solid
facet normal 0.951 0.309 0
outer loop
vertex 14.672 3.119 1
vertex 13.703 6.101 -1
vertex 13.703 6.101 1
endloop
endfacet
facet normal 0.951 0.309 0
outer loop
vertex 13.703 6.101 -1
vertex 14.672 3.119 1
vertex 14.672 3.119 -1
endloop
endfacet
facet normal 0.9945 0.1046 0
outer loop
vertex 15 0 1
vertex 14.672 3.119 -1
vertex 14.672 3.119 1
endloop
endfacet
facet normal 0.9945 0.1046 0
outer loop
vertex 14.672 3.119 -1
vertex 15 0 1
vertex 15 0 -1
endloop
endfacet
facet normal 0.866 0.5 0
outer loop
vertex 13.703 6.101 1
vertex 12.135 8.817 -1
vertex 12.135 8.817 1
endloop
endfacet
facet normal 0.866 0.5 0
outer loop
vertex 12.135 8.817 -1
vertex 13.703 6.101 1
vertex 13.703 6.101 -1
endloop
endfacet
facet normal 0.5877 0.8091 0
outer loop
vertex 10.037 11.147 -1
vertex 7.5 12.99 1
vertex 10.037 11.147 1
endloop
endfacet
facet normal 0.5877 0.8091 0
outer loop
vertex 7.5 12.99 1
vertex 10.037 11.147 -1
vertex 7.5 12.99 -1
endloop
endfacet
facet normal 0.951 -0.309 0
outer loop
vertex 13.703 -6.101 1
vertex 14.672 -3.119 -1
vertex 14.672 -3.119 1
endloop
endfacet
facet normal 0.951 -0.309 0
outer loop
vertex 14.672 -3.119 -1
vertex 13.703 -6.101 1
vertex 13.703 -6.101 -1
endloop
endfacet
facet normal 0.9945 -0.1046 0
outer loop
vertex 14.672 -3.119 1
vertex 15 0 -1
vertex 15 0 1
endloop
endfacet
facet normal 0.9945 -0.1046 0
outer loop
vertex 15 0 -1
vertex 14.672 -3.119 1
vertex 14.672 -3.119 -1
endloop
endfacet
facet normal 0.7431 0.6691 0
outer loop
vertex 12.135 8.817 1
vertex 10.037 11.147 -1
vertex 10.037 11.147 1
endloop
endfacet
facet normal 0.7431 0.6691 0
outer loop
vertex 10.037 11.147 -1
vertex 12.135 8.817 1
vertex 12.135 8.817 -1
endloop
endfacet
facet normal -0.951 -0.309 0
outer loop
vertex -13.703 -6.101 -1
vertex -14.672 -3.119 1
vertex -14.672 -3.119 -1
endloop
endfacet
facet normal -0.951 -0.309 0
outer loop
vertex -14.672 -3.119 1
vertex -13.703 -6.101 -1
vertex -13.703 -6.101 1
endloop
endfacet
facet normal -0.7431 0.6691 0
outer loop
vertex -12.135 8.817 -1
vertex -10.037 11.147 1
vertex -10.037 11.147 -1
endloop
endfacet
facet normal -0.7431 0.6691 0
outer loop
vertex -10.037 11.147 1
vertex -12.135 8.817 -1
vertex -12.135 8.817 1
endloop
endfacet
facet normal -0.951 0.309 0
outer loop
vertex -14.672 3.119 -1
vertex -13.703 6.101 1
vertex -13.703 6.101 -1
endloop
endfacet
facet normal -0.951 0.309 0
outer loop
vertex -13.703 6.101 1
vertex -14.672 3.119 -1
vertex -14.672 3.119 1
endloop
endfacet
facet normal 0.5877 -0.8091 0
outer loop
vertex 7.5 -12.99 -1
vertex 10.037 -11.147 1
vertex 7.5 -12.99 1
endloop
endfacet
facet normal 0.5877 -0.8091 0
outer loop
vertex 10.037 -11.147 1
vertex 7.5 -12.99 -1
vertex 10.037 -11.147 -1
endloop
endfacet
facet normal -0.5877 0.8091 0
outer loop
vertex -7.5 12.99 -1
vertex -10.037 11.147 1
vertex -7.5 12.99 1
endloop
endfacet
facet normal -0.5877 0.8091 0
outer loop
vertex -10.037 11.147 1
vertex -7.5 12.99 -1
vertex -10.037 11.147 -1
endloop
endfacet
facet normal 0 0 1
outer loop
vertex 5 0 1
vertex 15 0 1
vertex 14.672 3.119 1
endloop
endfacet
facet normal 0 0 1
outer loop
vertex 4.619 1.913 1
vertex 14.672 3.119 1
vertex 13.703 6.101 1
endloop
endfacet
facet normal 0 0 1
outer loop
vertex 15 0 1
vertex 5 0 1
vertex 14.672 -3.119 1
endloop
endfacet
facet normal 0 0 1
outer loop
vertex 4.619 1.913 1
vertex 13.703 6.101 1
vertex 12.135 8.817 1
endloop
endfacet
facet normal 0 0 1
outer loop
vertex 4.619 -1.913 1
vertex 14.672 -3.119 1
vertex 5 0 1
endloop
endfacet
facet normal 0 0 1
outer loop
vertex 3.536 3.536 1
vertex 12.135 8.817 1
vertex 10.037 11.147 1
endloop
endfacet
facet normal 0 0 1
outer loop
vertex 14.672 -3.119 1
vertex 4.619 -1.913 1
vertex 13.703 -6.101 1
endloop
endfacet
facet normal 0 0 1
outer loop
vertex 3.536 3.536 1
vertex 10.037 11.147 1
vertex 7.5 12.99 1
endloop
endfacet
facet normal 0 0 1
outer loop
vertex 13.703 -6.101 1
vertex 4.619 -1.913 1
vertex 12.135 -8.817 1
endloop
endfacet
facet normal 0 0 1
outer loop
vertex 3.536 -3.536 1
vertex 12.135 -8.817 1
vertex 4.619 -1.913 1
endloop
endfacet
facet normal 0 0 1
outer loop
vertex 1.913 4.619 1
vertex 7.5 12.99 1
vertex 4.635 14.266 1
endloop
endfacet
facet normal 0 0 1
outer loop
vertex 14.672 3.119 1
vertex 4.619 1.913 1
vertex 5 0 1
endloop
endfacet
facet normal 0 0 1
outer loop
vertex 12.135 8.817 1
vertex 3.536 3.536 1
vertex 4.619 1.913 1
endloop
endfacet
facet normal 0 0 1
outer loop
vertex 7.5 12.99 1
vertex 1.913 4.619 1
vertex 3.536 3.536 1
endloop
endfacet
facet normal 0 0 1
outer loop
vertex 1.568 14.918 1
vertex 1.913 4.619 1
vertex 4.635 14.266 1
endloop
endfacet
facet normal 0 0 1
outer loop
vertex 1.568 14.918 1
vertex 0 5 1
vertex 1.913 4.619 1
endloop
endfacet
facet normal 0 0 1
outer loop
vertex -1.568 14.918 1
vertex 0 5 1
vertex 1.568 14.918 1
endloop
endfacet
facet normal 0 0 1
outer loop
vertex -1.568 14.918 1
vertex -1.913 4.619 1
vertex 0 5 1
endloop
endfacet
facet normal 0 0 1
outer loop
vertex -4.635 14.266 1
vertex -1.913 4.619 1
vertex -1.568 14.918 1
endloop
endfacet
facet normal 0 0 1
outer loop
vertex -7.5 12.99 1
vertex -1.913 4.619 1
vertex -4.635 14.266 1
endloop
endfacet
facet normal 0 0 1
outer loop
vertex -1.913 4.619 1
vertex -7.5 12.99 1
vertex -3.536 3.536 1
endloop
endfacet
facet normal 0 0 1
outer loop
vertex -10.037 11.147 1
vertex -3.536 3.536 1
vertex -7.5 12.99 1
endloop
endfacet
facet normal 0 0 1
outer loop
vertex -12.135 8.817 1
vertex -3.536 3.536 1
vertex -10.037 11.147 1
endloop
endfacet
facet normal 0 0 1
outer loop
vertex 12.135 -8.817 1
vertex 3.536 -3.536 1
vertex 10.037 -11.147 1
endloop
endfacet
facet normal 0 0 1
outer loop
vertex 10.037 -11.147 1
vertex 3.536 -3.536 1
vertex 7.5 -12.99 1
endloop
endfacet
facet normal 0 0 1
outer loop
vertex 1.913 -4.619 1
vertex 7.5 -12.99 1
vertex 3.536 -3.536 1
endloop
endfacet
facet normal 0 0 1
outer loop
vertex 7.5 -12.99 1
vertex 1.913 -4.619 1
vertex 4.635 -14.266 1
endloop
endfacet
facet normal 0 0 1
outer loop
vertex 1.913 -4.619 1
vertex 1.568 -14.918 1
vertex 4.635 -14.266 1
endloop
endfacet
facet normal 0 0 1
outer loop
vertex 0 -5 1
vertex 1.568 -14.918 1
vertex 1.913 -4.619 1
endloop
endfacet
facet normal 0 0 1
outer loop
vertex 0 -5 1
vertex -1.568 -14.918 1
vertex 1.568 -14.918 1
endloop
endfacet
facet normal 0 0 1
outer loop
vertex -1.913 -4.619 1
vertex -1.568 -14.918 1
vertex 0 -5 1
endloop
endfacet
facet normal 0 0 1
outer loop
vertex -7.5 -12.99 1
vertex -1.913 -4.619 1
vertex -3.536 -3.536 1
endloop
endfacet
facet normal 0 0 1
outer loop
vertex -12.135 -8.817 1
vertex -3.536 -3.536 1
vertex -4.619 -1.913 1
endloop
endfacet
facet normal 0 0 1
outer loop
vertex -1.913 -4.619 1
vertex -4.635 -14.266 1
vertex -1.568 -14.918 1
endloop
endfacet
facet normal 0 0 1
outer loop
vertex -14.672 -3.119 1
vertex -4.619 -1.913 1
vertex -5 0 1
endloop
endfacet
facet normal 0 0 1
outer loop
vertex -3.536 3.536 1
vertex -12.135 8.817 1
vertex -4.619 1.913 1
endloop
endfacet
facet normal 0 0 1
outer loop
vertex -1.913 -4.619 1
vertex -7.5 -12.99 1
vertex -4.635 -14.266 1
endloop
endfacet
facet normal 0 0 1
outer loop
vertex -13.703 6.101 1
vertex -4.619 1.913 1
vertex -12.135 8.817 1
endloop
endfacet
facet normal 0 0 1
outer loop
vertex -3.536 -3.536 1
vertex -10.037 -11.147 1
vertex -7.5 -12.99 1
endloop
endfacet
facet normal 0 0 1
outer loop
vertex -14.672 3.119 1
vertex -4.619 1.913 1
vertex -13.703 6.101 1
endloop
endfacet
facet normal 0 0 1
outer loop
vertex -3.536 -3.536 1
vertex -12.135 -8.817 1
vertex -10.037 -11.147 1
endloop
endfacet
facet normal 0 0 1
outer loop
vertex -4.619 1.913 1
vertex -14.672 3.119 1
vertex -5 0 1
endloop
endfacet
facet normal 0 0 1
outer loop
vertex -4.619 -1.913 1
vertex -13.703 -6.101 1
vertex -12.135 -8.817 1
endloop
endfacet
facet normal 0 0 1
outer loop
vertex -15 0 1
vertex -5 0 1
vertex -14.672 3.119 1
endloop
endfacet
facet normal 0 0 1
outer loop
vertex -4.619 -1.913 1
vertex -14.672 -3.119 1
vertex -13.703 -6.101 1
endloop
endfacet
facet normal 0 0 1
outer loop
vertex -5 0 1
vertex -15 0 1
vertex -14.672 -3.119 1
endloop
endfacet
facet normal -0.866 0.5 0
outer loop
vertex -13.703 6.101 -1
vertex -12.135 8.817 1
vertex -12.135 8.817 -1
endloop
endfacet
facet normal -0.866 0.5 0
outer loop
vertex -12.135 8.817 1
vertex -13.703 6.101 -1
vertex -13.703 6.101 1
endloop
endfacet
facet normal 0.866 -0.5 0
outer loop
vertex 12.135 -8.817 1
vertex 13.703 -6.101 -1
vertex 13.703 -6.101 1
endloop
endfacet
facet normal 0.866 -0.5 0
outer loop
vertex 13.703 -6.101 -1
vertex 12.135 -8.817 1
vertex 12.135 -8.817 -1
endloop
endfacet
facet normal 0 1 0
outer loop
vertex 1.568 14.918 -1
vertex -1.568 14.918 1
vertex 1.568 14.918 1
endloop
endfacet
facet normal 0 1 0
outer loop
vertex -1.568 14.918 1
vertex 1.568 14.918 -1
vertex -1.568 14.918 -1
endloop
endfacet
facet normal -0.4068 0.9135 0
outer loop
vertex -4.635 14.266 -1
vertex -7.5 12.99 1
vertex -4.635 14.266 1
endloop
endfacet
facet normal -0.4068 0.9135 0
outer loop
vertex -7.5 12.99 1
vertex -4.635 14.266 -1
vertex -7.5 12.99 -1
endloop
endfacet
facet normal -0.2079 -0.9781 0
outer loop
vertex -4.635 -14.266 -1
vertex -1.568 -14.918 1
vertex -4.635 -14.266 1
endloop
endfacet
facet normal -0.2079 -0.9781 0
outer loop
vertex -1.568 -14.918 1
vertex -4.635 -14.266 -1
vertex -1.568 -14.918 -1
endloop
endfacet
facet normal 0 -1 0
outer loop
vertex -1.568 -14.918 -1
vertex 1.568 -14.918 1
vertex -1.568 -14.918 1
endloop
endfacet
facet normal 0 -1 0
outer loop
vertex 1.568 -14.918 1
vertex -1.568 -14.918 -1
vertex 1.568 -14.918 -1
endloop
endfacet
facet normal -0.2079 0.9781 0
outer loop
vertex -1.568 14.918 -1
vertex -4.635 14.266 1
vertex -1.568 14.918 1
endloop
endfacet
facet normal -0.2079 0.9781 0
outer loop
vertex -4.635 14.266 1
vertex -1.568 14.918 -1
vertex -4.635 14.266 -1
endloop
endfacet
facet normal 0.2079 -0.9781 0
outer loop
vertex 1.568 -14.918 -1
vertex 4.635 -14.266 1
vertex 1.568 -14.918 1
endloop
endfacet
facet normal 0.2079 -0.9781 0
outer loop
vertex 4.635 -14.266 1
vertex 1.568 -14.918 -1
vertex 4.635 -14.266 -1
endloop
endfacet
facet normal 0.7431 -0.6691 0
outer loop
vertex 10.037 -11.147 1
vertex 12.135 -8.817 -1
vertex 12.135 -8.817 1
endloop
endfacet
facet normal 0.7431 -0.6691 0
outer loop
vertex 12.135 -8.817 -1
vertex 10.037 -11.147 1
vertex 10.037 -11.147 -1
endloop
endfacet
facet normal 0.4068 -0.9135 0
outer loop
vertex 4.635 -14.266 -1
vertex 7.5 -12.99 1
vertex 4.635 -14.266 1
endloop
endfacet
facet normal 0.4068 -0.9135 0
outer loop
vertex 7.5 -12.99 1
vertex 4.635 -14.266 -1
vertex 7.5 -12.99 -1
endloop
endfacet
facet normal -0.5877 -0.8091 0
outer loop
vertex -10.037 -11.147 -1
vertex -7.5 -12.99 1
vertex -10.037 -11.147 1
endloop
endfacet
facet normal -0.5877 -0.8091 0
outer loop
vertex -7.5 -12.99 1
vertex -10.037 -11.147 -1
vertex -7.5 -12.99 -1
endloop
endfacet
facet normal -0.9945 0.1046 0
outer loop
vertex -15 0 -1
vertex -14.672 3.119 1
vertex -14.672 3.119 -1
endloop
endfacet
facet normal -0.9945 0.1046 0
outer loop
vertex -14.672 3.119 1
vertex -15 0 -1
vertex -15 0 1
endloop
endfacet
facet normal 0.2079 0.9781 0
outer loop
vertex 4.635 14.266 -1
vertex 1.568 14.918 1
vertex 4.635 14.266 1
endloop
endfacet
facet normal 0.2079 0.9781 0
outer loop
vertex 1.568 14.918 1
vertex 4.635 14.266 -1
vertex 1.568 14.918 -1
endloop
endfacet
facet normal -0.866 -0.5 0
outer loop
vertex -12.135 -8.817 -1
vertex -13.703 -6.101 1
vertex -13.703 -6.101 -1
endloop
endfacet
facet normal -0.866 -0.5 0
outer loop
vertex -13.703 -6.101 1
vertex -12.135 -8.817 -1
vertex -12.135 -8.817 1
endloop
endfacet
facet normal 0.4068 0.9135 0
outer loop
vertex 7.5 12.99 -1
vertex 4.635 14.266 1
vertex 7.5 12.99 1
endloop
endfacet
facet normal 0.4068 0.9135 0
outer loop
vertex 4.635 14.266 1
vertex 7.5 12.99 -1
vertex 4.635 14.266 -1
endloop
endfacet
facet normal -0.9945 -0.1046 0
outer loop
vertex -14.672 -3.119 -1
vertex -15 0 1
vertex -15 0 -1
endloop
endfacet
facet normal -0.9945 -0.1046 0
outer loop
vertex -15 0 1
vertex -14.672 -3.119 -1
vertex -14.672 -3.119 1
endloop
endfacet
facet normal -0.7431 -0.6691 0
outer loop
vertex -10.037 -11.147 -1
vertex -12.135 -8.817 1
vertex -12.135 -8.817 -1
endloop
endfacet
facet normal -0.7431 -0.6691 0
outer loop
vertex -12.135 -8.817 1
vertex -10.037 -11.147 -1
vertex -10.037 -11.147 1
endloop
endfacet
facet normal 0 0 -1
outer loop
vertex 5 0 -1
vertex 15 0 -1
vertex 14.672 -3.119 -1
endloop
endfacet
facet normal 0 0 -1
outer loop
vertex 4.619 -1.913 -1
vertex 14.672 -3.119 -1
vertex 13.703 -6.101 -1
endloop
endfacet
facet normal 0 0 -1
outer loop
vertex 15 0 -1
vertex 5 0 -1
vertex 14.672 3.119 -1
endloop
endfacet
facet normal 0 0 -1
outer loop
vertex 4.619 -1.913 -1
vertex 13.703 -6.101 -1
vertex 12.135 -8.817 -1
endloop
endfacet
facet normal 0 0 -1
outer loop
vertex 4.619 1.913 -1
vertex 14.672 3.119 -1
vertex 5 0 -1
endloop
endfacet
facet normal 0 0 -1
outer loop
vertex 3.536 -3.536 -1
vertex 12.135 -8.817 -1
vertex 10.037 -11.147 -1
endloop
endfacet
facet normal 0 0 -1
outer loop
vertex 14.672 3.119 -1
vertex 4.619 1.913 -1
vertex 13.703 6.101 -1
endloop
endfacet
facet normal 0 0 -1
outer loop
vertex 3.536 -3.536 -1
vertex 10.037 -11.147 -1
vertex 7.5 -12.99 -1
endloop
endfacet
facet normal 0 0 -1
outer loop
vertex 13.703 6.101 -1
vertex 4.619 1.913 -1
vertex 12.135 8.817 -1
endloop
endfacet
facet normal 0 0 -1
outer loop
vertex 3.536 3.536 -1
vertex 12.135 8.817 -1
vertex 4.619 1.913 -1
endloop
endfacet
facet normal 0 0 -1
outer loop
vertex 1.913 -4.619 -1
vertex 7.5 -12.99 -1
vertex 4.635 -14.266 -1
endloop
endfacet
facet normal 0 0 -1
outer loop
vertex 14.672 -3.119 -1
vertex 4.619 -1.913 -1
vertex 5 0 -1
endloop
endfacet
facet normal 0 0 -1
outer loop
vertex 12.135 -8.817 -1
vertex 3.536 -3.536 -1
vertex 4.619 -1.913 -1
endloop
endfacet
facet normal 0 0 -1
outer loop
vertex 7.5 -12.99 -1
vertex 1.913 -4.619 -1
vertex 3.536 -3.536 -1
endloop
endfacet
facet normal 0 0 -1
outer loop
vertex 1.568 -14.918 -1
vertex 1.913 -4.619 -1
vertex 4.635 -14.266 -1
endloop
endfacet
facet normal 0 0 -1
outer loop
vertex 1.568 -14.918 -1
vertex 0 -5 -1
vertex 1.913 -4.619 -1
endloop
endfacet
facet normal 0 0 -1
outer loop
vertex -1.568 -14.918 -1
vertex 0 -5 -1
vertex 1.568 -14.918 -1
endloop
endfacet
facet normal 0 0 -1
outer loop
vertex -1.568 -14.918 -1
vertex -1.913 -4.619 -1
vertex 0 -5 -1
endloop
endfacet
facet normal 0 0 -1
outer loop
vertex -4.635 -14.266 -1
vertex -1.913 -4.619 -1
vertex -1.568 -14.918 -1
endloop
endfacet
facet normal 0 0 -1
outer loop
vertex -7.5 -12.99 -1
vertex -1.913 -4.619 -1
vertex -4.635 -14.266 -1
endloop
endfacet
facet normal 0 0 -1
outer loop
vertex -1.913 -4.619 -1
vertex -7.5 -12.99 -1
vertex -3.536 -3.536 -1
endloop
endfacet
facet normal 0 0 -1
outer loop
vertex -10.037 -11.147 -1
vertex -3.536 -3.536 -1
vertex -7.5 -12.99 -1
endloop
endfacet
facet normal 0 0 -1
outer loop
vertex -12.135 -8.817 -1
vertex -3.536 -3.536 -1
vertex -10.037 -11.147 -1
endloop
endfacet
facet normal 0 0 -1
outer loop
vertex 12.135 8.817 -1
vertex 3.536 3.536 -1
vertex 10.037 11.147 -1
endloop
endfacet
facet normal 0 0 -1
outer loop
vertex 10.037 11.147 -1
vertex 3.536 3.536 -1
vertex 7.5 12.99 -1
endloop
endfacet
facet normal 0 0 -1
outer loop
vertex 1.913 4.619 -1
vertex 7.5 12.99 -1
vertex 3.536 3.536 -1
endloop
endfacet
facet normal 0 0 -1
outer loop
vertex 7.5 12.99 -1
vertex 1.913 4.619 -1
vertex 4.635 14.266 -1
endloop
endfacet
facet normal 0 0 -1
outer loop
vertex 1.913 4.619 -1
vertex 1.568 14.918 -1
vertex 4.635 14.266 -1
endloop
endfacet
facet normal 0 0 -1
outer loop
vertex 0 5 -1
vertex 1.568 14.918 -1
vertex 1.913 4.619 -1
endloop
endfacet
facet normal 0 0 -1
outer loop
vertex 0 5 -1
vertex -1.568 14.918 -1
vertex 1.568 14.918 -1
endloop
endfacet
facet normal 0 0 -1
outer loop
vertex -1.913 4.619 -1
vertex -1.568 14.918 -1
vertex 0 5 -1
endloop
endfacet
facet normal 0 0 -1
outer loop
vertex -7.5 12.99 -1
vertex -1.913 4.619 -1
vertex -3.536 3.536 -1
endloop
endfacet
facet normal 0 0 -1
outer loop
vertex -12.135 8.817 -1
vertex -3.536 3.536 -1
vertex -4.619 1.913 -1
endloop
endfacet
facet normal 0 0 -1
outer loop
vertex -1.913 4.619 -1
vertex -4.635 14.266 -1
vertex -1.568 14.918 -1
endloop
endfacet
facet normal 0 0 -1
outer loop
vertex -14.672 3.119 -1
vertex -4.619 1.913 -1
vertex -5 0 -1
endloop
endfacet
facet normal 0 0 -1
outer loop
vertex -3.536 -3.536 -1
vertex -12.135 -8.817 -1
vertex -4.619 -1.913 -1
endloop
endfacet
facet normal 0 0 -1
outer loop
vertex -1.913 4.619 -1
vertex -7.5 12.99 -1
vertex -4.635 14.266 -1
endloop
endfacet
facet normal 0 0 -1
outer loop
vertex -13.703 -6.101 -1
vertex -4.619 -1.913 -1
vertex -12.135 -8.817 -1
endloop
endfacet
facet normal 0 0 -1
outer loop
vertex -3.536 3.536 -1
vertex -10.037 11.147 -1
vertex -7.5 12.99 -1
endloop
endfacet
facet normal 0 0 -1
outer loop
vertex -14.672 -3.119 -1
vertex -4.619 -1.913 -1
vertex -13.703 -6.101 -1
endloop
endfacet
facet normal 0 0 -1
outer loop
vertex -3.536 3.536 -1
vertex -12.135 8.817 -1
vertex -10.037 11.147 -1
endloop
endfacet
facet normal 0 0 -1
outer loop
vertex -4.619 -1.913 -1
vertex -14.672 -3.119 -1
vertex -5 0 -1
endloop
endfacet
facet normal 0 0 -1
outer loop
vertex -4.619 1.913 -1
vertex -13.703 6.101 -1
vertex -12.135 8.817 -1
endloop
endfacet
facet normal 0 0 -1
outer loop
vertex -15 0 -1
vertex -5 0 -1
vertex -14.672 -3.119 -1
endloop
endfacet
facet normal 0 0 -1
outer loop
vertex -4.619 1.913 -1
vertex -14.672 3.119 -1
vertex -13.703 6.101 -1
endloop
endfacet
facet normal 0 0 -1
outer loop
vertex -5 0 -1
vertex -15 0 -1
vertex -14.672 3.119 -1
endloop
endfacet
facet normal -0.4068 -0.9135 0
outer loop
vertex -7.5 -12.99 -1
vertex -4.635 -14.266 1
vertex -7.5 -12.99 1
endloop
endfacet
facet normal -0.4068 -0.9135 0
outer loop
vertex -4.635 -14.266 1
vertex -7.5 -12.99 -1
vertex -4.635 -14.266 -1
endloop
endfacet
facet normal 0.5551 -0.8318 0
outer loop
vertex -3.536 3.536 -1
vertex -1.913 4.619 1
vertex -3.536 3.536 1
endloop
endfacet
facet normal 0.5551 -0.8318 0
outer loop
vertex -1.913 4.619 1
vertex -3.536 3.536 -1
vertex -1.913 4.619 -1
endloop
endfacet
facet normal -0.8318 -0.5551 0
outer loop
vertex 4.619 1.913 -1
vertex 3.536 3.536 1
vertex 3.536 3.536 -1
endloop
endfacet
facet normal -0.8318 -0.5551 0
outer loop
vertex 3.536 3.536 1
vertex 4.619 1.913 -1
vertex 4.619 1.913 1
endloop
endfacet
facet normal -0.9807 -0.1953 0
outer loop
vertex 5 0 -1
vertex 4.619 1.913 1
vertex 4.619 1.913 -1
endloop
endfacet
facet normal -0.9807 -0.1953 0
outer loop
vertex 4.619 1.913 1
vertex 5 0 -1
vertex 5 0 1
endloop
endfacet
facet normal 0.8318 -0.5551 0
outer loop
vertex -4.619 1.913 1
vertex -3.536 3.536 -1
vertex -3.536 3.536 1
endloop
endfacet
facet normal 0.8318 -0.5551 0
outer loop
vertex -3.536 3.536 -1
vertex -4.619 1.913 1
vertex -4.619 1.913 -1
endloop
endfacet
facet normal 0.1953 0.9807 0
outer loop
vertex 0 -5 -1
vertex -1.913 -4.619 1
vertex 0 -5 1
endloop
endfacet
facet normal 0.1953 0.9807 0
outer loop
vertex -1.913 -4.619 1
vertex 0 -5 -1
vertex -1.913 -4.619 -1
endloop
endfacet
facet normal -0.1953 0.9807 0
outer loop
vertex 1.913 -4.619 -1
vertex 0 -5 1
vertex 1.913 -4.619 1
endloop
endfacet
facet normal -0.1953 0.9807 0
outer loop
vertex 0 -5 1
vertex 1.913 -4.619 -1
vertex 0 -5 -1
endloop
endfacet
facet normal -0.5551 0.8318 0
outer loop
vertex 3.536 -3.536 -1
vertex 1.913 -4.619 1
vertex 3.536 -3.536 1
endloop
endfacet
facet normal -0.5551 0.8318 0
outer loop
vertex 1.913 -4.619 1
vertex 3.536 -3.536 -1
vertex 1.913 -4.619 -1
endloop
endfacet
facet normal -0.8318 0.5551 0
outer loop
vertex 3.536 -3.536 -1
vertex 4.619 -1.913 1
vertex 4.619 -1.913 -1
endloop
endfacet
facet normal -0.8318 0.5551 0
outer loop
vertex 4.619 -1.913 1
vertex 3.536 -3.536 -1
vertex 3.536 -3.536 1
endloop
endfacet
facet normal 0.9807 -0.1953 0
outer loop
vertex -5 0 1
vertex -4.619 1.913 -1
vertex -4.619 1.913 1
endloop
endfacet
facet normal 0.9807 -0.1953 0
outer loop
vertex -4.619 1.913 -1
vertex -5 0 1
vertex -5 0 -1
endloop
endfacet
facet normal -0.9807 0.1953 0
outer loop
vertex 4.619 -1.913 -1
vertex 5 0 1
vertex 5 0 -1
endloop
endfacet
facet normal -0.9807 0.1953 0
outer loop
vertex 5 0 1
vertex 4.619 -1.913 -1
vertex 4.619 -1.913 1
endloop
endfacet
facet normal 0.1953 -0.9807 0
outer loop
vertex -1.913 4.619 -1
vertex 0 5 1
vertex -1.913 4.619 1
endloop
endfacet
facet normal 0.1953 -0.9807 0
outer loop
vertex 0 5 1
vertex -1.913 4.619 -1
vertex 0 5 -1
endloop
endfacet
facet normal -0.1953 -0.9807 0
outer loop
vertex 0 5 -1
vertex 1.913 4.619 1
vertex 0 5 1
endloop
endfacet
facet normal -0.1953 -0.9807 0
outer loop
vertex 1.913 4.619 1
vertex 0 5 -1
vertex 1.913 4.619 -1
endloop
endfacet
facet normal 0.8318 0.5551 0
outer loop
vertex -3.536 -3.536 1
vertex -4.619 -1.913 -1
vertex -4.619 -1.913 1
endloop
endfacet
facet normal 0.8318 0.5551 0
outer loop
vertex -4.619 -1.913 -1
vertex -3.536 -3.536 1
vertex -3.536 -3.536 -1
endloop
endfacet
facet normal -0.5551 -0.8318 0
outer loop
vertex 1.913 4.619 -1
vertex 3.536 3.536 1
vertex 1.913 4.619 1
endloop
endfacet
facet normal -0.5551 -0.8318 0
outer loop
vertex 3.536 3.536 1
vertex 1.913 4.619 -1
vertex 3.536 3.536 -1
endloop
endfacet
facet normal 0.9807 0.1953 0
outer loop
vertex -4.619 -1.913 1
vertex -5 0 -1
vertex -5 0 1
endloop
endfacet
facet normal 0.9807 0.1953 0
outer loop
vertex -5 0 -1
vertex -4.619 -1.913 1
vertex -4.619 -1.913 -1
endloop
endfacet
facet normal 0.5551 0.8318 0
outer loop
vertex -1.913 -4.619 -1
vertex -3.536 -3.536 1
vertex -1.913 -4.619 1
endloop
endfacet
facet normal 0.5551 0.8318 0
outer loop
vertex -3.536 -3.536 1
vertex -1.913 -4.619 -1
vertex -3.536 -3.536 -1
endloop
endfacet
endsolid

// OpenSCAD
// Parameters for the penny washer
inner_hole_diameter = 10; // Diameter of the central hole
outer_diameter = 30;      // Outer diameter of the washer
thickness = 2;            // Thickness of the washer

// Module to create the penny washer
module penny_washer() {
    difference() {
        // Outer cylinder representing the washer body
        cylinder(h = thickness, d = outer_diameter, center = true);
        // Inner cylinder representing the central through-hole
        cylinder(h = thickness + 1, d = inner_hole_diameter, center = true);
    }
}

// Render the penny washer
penny_washer();
